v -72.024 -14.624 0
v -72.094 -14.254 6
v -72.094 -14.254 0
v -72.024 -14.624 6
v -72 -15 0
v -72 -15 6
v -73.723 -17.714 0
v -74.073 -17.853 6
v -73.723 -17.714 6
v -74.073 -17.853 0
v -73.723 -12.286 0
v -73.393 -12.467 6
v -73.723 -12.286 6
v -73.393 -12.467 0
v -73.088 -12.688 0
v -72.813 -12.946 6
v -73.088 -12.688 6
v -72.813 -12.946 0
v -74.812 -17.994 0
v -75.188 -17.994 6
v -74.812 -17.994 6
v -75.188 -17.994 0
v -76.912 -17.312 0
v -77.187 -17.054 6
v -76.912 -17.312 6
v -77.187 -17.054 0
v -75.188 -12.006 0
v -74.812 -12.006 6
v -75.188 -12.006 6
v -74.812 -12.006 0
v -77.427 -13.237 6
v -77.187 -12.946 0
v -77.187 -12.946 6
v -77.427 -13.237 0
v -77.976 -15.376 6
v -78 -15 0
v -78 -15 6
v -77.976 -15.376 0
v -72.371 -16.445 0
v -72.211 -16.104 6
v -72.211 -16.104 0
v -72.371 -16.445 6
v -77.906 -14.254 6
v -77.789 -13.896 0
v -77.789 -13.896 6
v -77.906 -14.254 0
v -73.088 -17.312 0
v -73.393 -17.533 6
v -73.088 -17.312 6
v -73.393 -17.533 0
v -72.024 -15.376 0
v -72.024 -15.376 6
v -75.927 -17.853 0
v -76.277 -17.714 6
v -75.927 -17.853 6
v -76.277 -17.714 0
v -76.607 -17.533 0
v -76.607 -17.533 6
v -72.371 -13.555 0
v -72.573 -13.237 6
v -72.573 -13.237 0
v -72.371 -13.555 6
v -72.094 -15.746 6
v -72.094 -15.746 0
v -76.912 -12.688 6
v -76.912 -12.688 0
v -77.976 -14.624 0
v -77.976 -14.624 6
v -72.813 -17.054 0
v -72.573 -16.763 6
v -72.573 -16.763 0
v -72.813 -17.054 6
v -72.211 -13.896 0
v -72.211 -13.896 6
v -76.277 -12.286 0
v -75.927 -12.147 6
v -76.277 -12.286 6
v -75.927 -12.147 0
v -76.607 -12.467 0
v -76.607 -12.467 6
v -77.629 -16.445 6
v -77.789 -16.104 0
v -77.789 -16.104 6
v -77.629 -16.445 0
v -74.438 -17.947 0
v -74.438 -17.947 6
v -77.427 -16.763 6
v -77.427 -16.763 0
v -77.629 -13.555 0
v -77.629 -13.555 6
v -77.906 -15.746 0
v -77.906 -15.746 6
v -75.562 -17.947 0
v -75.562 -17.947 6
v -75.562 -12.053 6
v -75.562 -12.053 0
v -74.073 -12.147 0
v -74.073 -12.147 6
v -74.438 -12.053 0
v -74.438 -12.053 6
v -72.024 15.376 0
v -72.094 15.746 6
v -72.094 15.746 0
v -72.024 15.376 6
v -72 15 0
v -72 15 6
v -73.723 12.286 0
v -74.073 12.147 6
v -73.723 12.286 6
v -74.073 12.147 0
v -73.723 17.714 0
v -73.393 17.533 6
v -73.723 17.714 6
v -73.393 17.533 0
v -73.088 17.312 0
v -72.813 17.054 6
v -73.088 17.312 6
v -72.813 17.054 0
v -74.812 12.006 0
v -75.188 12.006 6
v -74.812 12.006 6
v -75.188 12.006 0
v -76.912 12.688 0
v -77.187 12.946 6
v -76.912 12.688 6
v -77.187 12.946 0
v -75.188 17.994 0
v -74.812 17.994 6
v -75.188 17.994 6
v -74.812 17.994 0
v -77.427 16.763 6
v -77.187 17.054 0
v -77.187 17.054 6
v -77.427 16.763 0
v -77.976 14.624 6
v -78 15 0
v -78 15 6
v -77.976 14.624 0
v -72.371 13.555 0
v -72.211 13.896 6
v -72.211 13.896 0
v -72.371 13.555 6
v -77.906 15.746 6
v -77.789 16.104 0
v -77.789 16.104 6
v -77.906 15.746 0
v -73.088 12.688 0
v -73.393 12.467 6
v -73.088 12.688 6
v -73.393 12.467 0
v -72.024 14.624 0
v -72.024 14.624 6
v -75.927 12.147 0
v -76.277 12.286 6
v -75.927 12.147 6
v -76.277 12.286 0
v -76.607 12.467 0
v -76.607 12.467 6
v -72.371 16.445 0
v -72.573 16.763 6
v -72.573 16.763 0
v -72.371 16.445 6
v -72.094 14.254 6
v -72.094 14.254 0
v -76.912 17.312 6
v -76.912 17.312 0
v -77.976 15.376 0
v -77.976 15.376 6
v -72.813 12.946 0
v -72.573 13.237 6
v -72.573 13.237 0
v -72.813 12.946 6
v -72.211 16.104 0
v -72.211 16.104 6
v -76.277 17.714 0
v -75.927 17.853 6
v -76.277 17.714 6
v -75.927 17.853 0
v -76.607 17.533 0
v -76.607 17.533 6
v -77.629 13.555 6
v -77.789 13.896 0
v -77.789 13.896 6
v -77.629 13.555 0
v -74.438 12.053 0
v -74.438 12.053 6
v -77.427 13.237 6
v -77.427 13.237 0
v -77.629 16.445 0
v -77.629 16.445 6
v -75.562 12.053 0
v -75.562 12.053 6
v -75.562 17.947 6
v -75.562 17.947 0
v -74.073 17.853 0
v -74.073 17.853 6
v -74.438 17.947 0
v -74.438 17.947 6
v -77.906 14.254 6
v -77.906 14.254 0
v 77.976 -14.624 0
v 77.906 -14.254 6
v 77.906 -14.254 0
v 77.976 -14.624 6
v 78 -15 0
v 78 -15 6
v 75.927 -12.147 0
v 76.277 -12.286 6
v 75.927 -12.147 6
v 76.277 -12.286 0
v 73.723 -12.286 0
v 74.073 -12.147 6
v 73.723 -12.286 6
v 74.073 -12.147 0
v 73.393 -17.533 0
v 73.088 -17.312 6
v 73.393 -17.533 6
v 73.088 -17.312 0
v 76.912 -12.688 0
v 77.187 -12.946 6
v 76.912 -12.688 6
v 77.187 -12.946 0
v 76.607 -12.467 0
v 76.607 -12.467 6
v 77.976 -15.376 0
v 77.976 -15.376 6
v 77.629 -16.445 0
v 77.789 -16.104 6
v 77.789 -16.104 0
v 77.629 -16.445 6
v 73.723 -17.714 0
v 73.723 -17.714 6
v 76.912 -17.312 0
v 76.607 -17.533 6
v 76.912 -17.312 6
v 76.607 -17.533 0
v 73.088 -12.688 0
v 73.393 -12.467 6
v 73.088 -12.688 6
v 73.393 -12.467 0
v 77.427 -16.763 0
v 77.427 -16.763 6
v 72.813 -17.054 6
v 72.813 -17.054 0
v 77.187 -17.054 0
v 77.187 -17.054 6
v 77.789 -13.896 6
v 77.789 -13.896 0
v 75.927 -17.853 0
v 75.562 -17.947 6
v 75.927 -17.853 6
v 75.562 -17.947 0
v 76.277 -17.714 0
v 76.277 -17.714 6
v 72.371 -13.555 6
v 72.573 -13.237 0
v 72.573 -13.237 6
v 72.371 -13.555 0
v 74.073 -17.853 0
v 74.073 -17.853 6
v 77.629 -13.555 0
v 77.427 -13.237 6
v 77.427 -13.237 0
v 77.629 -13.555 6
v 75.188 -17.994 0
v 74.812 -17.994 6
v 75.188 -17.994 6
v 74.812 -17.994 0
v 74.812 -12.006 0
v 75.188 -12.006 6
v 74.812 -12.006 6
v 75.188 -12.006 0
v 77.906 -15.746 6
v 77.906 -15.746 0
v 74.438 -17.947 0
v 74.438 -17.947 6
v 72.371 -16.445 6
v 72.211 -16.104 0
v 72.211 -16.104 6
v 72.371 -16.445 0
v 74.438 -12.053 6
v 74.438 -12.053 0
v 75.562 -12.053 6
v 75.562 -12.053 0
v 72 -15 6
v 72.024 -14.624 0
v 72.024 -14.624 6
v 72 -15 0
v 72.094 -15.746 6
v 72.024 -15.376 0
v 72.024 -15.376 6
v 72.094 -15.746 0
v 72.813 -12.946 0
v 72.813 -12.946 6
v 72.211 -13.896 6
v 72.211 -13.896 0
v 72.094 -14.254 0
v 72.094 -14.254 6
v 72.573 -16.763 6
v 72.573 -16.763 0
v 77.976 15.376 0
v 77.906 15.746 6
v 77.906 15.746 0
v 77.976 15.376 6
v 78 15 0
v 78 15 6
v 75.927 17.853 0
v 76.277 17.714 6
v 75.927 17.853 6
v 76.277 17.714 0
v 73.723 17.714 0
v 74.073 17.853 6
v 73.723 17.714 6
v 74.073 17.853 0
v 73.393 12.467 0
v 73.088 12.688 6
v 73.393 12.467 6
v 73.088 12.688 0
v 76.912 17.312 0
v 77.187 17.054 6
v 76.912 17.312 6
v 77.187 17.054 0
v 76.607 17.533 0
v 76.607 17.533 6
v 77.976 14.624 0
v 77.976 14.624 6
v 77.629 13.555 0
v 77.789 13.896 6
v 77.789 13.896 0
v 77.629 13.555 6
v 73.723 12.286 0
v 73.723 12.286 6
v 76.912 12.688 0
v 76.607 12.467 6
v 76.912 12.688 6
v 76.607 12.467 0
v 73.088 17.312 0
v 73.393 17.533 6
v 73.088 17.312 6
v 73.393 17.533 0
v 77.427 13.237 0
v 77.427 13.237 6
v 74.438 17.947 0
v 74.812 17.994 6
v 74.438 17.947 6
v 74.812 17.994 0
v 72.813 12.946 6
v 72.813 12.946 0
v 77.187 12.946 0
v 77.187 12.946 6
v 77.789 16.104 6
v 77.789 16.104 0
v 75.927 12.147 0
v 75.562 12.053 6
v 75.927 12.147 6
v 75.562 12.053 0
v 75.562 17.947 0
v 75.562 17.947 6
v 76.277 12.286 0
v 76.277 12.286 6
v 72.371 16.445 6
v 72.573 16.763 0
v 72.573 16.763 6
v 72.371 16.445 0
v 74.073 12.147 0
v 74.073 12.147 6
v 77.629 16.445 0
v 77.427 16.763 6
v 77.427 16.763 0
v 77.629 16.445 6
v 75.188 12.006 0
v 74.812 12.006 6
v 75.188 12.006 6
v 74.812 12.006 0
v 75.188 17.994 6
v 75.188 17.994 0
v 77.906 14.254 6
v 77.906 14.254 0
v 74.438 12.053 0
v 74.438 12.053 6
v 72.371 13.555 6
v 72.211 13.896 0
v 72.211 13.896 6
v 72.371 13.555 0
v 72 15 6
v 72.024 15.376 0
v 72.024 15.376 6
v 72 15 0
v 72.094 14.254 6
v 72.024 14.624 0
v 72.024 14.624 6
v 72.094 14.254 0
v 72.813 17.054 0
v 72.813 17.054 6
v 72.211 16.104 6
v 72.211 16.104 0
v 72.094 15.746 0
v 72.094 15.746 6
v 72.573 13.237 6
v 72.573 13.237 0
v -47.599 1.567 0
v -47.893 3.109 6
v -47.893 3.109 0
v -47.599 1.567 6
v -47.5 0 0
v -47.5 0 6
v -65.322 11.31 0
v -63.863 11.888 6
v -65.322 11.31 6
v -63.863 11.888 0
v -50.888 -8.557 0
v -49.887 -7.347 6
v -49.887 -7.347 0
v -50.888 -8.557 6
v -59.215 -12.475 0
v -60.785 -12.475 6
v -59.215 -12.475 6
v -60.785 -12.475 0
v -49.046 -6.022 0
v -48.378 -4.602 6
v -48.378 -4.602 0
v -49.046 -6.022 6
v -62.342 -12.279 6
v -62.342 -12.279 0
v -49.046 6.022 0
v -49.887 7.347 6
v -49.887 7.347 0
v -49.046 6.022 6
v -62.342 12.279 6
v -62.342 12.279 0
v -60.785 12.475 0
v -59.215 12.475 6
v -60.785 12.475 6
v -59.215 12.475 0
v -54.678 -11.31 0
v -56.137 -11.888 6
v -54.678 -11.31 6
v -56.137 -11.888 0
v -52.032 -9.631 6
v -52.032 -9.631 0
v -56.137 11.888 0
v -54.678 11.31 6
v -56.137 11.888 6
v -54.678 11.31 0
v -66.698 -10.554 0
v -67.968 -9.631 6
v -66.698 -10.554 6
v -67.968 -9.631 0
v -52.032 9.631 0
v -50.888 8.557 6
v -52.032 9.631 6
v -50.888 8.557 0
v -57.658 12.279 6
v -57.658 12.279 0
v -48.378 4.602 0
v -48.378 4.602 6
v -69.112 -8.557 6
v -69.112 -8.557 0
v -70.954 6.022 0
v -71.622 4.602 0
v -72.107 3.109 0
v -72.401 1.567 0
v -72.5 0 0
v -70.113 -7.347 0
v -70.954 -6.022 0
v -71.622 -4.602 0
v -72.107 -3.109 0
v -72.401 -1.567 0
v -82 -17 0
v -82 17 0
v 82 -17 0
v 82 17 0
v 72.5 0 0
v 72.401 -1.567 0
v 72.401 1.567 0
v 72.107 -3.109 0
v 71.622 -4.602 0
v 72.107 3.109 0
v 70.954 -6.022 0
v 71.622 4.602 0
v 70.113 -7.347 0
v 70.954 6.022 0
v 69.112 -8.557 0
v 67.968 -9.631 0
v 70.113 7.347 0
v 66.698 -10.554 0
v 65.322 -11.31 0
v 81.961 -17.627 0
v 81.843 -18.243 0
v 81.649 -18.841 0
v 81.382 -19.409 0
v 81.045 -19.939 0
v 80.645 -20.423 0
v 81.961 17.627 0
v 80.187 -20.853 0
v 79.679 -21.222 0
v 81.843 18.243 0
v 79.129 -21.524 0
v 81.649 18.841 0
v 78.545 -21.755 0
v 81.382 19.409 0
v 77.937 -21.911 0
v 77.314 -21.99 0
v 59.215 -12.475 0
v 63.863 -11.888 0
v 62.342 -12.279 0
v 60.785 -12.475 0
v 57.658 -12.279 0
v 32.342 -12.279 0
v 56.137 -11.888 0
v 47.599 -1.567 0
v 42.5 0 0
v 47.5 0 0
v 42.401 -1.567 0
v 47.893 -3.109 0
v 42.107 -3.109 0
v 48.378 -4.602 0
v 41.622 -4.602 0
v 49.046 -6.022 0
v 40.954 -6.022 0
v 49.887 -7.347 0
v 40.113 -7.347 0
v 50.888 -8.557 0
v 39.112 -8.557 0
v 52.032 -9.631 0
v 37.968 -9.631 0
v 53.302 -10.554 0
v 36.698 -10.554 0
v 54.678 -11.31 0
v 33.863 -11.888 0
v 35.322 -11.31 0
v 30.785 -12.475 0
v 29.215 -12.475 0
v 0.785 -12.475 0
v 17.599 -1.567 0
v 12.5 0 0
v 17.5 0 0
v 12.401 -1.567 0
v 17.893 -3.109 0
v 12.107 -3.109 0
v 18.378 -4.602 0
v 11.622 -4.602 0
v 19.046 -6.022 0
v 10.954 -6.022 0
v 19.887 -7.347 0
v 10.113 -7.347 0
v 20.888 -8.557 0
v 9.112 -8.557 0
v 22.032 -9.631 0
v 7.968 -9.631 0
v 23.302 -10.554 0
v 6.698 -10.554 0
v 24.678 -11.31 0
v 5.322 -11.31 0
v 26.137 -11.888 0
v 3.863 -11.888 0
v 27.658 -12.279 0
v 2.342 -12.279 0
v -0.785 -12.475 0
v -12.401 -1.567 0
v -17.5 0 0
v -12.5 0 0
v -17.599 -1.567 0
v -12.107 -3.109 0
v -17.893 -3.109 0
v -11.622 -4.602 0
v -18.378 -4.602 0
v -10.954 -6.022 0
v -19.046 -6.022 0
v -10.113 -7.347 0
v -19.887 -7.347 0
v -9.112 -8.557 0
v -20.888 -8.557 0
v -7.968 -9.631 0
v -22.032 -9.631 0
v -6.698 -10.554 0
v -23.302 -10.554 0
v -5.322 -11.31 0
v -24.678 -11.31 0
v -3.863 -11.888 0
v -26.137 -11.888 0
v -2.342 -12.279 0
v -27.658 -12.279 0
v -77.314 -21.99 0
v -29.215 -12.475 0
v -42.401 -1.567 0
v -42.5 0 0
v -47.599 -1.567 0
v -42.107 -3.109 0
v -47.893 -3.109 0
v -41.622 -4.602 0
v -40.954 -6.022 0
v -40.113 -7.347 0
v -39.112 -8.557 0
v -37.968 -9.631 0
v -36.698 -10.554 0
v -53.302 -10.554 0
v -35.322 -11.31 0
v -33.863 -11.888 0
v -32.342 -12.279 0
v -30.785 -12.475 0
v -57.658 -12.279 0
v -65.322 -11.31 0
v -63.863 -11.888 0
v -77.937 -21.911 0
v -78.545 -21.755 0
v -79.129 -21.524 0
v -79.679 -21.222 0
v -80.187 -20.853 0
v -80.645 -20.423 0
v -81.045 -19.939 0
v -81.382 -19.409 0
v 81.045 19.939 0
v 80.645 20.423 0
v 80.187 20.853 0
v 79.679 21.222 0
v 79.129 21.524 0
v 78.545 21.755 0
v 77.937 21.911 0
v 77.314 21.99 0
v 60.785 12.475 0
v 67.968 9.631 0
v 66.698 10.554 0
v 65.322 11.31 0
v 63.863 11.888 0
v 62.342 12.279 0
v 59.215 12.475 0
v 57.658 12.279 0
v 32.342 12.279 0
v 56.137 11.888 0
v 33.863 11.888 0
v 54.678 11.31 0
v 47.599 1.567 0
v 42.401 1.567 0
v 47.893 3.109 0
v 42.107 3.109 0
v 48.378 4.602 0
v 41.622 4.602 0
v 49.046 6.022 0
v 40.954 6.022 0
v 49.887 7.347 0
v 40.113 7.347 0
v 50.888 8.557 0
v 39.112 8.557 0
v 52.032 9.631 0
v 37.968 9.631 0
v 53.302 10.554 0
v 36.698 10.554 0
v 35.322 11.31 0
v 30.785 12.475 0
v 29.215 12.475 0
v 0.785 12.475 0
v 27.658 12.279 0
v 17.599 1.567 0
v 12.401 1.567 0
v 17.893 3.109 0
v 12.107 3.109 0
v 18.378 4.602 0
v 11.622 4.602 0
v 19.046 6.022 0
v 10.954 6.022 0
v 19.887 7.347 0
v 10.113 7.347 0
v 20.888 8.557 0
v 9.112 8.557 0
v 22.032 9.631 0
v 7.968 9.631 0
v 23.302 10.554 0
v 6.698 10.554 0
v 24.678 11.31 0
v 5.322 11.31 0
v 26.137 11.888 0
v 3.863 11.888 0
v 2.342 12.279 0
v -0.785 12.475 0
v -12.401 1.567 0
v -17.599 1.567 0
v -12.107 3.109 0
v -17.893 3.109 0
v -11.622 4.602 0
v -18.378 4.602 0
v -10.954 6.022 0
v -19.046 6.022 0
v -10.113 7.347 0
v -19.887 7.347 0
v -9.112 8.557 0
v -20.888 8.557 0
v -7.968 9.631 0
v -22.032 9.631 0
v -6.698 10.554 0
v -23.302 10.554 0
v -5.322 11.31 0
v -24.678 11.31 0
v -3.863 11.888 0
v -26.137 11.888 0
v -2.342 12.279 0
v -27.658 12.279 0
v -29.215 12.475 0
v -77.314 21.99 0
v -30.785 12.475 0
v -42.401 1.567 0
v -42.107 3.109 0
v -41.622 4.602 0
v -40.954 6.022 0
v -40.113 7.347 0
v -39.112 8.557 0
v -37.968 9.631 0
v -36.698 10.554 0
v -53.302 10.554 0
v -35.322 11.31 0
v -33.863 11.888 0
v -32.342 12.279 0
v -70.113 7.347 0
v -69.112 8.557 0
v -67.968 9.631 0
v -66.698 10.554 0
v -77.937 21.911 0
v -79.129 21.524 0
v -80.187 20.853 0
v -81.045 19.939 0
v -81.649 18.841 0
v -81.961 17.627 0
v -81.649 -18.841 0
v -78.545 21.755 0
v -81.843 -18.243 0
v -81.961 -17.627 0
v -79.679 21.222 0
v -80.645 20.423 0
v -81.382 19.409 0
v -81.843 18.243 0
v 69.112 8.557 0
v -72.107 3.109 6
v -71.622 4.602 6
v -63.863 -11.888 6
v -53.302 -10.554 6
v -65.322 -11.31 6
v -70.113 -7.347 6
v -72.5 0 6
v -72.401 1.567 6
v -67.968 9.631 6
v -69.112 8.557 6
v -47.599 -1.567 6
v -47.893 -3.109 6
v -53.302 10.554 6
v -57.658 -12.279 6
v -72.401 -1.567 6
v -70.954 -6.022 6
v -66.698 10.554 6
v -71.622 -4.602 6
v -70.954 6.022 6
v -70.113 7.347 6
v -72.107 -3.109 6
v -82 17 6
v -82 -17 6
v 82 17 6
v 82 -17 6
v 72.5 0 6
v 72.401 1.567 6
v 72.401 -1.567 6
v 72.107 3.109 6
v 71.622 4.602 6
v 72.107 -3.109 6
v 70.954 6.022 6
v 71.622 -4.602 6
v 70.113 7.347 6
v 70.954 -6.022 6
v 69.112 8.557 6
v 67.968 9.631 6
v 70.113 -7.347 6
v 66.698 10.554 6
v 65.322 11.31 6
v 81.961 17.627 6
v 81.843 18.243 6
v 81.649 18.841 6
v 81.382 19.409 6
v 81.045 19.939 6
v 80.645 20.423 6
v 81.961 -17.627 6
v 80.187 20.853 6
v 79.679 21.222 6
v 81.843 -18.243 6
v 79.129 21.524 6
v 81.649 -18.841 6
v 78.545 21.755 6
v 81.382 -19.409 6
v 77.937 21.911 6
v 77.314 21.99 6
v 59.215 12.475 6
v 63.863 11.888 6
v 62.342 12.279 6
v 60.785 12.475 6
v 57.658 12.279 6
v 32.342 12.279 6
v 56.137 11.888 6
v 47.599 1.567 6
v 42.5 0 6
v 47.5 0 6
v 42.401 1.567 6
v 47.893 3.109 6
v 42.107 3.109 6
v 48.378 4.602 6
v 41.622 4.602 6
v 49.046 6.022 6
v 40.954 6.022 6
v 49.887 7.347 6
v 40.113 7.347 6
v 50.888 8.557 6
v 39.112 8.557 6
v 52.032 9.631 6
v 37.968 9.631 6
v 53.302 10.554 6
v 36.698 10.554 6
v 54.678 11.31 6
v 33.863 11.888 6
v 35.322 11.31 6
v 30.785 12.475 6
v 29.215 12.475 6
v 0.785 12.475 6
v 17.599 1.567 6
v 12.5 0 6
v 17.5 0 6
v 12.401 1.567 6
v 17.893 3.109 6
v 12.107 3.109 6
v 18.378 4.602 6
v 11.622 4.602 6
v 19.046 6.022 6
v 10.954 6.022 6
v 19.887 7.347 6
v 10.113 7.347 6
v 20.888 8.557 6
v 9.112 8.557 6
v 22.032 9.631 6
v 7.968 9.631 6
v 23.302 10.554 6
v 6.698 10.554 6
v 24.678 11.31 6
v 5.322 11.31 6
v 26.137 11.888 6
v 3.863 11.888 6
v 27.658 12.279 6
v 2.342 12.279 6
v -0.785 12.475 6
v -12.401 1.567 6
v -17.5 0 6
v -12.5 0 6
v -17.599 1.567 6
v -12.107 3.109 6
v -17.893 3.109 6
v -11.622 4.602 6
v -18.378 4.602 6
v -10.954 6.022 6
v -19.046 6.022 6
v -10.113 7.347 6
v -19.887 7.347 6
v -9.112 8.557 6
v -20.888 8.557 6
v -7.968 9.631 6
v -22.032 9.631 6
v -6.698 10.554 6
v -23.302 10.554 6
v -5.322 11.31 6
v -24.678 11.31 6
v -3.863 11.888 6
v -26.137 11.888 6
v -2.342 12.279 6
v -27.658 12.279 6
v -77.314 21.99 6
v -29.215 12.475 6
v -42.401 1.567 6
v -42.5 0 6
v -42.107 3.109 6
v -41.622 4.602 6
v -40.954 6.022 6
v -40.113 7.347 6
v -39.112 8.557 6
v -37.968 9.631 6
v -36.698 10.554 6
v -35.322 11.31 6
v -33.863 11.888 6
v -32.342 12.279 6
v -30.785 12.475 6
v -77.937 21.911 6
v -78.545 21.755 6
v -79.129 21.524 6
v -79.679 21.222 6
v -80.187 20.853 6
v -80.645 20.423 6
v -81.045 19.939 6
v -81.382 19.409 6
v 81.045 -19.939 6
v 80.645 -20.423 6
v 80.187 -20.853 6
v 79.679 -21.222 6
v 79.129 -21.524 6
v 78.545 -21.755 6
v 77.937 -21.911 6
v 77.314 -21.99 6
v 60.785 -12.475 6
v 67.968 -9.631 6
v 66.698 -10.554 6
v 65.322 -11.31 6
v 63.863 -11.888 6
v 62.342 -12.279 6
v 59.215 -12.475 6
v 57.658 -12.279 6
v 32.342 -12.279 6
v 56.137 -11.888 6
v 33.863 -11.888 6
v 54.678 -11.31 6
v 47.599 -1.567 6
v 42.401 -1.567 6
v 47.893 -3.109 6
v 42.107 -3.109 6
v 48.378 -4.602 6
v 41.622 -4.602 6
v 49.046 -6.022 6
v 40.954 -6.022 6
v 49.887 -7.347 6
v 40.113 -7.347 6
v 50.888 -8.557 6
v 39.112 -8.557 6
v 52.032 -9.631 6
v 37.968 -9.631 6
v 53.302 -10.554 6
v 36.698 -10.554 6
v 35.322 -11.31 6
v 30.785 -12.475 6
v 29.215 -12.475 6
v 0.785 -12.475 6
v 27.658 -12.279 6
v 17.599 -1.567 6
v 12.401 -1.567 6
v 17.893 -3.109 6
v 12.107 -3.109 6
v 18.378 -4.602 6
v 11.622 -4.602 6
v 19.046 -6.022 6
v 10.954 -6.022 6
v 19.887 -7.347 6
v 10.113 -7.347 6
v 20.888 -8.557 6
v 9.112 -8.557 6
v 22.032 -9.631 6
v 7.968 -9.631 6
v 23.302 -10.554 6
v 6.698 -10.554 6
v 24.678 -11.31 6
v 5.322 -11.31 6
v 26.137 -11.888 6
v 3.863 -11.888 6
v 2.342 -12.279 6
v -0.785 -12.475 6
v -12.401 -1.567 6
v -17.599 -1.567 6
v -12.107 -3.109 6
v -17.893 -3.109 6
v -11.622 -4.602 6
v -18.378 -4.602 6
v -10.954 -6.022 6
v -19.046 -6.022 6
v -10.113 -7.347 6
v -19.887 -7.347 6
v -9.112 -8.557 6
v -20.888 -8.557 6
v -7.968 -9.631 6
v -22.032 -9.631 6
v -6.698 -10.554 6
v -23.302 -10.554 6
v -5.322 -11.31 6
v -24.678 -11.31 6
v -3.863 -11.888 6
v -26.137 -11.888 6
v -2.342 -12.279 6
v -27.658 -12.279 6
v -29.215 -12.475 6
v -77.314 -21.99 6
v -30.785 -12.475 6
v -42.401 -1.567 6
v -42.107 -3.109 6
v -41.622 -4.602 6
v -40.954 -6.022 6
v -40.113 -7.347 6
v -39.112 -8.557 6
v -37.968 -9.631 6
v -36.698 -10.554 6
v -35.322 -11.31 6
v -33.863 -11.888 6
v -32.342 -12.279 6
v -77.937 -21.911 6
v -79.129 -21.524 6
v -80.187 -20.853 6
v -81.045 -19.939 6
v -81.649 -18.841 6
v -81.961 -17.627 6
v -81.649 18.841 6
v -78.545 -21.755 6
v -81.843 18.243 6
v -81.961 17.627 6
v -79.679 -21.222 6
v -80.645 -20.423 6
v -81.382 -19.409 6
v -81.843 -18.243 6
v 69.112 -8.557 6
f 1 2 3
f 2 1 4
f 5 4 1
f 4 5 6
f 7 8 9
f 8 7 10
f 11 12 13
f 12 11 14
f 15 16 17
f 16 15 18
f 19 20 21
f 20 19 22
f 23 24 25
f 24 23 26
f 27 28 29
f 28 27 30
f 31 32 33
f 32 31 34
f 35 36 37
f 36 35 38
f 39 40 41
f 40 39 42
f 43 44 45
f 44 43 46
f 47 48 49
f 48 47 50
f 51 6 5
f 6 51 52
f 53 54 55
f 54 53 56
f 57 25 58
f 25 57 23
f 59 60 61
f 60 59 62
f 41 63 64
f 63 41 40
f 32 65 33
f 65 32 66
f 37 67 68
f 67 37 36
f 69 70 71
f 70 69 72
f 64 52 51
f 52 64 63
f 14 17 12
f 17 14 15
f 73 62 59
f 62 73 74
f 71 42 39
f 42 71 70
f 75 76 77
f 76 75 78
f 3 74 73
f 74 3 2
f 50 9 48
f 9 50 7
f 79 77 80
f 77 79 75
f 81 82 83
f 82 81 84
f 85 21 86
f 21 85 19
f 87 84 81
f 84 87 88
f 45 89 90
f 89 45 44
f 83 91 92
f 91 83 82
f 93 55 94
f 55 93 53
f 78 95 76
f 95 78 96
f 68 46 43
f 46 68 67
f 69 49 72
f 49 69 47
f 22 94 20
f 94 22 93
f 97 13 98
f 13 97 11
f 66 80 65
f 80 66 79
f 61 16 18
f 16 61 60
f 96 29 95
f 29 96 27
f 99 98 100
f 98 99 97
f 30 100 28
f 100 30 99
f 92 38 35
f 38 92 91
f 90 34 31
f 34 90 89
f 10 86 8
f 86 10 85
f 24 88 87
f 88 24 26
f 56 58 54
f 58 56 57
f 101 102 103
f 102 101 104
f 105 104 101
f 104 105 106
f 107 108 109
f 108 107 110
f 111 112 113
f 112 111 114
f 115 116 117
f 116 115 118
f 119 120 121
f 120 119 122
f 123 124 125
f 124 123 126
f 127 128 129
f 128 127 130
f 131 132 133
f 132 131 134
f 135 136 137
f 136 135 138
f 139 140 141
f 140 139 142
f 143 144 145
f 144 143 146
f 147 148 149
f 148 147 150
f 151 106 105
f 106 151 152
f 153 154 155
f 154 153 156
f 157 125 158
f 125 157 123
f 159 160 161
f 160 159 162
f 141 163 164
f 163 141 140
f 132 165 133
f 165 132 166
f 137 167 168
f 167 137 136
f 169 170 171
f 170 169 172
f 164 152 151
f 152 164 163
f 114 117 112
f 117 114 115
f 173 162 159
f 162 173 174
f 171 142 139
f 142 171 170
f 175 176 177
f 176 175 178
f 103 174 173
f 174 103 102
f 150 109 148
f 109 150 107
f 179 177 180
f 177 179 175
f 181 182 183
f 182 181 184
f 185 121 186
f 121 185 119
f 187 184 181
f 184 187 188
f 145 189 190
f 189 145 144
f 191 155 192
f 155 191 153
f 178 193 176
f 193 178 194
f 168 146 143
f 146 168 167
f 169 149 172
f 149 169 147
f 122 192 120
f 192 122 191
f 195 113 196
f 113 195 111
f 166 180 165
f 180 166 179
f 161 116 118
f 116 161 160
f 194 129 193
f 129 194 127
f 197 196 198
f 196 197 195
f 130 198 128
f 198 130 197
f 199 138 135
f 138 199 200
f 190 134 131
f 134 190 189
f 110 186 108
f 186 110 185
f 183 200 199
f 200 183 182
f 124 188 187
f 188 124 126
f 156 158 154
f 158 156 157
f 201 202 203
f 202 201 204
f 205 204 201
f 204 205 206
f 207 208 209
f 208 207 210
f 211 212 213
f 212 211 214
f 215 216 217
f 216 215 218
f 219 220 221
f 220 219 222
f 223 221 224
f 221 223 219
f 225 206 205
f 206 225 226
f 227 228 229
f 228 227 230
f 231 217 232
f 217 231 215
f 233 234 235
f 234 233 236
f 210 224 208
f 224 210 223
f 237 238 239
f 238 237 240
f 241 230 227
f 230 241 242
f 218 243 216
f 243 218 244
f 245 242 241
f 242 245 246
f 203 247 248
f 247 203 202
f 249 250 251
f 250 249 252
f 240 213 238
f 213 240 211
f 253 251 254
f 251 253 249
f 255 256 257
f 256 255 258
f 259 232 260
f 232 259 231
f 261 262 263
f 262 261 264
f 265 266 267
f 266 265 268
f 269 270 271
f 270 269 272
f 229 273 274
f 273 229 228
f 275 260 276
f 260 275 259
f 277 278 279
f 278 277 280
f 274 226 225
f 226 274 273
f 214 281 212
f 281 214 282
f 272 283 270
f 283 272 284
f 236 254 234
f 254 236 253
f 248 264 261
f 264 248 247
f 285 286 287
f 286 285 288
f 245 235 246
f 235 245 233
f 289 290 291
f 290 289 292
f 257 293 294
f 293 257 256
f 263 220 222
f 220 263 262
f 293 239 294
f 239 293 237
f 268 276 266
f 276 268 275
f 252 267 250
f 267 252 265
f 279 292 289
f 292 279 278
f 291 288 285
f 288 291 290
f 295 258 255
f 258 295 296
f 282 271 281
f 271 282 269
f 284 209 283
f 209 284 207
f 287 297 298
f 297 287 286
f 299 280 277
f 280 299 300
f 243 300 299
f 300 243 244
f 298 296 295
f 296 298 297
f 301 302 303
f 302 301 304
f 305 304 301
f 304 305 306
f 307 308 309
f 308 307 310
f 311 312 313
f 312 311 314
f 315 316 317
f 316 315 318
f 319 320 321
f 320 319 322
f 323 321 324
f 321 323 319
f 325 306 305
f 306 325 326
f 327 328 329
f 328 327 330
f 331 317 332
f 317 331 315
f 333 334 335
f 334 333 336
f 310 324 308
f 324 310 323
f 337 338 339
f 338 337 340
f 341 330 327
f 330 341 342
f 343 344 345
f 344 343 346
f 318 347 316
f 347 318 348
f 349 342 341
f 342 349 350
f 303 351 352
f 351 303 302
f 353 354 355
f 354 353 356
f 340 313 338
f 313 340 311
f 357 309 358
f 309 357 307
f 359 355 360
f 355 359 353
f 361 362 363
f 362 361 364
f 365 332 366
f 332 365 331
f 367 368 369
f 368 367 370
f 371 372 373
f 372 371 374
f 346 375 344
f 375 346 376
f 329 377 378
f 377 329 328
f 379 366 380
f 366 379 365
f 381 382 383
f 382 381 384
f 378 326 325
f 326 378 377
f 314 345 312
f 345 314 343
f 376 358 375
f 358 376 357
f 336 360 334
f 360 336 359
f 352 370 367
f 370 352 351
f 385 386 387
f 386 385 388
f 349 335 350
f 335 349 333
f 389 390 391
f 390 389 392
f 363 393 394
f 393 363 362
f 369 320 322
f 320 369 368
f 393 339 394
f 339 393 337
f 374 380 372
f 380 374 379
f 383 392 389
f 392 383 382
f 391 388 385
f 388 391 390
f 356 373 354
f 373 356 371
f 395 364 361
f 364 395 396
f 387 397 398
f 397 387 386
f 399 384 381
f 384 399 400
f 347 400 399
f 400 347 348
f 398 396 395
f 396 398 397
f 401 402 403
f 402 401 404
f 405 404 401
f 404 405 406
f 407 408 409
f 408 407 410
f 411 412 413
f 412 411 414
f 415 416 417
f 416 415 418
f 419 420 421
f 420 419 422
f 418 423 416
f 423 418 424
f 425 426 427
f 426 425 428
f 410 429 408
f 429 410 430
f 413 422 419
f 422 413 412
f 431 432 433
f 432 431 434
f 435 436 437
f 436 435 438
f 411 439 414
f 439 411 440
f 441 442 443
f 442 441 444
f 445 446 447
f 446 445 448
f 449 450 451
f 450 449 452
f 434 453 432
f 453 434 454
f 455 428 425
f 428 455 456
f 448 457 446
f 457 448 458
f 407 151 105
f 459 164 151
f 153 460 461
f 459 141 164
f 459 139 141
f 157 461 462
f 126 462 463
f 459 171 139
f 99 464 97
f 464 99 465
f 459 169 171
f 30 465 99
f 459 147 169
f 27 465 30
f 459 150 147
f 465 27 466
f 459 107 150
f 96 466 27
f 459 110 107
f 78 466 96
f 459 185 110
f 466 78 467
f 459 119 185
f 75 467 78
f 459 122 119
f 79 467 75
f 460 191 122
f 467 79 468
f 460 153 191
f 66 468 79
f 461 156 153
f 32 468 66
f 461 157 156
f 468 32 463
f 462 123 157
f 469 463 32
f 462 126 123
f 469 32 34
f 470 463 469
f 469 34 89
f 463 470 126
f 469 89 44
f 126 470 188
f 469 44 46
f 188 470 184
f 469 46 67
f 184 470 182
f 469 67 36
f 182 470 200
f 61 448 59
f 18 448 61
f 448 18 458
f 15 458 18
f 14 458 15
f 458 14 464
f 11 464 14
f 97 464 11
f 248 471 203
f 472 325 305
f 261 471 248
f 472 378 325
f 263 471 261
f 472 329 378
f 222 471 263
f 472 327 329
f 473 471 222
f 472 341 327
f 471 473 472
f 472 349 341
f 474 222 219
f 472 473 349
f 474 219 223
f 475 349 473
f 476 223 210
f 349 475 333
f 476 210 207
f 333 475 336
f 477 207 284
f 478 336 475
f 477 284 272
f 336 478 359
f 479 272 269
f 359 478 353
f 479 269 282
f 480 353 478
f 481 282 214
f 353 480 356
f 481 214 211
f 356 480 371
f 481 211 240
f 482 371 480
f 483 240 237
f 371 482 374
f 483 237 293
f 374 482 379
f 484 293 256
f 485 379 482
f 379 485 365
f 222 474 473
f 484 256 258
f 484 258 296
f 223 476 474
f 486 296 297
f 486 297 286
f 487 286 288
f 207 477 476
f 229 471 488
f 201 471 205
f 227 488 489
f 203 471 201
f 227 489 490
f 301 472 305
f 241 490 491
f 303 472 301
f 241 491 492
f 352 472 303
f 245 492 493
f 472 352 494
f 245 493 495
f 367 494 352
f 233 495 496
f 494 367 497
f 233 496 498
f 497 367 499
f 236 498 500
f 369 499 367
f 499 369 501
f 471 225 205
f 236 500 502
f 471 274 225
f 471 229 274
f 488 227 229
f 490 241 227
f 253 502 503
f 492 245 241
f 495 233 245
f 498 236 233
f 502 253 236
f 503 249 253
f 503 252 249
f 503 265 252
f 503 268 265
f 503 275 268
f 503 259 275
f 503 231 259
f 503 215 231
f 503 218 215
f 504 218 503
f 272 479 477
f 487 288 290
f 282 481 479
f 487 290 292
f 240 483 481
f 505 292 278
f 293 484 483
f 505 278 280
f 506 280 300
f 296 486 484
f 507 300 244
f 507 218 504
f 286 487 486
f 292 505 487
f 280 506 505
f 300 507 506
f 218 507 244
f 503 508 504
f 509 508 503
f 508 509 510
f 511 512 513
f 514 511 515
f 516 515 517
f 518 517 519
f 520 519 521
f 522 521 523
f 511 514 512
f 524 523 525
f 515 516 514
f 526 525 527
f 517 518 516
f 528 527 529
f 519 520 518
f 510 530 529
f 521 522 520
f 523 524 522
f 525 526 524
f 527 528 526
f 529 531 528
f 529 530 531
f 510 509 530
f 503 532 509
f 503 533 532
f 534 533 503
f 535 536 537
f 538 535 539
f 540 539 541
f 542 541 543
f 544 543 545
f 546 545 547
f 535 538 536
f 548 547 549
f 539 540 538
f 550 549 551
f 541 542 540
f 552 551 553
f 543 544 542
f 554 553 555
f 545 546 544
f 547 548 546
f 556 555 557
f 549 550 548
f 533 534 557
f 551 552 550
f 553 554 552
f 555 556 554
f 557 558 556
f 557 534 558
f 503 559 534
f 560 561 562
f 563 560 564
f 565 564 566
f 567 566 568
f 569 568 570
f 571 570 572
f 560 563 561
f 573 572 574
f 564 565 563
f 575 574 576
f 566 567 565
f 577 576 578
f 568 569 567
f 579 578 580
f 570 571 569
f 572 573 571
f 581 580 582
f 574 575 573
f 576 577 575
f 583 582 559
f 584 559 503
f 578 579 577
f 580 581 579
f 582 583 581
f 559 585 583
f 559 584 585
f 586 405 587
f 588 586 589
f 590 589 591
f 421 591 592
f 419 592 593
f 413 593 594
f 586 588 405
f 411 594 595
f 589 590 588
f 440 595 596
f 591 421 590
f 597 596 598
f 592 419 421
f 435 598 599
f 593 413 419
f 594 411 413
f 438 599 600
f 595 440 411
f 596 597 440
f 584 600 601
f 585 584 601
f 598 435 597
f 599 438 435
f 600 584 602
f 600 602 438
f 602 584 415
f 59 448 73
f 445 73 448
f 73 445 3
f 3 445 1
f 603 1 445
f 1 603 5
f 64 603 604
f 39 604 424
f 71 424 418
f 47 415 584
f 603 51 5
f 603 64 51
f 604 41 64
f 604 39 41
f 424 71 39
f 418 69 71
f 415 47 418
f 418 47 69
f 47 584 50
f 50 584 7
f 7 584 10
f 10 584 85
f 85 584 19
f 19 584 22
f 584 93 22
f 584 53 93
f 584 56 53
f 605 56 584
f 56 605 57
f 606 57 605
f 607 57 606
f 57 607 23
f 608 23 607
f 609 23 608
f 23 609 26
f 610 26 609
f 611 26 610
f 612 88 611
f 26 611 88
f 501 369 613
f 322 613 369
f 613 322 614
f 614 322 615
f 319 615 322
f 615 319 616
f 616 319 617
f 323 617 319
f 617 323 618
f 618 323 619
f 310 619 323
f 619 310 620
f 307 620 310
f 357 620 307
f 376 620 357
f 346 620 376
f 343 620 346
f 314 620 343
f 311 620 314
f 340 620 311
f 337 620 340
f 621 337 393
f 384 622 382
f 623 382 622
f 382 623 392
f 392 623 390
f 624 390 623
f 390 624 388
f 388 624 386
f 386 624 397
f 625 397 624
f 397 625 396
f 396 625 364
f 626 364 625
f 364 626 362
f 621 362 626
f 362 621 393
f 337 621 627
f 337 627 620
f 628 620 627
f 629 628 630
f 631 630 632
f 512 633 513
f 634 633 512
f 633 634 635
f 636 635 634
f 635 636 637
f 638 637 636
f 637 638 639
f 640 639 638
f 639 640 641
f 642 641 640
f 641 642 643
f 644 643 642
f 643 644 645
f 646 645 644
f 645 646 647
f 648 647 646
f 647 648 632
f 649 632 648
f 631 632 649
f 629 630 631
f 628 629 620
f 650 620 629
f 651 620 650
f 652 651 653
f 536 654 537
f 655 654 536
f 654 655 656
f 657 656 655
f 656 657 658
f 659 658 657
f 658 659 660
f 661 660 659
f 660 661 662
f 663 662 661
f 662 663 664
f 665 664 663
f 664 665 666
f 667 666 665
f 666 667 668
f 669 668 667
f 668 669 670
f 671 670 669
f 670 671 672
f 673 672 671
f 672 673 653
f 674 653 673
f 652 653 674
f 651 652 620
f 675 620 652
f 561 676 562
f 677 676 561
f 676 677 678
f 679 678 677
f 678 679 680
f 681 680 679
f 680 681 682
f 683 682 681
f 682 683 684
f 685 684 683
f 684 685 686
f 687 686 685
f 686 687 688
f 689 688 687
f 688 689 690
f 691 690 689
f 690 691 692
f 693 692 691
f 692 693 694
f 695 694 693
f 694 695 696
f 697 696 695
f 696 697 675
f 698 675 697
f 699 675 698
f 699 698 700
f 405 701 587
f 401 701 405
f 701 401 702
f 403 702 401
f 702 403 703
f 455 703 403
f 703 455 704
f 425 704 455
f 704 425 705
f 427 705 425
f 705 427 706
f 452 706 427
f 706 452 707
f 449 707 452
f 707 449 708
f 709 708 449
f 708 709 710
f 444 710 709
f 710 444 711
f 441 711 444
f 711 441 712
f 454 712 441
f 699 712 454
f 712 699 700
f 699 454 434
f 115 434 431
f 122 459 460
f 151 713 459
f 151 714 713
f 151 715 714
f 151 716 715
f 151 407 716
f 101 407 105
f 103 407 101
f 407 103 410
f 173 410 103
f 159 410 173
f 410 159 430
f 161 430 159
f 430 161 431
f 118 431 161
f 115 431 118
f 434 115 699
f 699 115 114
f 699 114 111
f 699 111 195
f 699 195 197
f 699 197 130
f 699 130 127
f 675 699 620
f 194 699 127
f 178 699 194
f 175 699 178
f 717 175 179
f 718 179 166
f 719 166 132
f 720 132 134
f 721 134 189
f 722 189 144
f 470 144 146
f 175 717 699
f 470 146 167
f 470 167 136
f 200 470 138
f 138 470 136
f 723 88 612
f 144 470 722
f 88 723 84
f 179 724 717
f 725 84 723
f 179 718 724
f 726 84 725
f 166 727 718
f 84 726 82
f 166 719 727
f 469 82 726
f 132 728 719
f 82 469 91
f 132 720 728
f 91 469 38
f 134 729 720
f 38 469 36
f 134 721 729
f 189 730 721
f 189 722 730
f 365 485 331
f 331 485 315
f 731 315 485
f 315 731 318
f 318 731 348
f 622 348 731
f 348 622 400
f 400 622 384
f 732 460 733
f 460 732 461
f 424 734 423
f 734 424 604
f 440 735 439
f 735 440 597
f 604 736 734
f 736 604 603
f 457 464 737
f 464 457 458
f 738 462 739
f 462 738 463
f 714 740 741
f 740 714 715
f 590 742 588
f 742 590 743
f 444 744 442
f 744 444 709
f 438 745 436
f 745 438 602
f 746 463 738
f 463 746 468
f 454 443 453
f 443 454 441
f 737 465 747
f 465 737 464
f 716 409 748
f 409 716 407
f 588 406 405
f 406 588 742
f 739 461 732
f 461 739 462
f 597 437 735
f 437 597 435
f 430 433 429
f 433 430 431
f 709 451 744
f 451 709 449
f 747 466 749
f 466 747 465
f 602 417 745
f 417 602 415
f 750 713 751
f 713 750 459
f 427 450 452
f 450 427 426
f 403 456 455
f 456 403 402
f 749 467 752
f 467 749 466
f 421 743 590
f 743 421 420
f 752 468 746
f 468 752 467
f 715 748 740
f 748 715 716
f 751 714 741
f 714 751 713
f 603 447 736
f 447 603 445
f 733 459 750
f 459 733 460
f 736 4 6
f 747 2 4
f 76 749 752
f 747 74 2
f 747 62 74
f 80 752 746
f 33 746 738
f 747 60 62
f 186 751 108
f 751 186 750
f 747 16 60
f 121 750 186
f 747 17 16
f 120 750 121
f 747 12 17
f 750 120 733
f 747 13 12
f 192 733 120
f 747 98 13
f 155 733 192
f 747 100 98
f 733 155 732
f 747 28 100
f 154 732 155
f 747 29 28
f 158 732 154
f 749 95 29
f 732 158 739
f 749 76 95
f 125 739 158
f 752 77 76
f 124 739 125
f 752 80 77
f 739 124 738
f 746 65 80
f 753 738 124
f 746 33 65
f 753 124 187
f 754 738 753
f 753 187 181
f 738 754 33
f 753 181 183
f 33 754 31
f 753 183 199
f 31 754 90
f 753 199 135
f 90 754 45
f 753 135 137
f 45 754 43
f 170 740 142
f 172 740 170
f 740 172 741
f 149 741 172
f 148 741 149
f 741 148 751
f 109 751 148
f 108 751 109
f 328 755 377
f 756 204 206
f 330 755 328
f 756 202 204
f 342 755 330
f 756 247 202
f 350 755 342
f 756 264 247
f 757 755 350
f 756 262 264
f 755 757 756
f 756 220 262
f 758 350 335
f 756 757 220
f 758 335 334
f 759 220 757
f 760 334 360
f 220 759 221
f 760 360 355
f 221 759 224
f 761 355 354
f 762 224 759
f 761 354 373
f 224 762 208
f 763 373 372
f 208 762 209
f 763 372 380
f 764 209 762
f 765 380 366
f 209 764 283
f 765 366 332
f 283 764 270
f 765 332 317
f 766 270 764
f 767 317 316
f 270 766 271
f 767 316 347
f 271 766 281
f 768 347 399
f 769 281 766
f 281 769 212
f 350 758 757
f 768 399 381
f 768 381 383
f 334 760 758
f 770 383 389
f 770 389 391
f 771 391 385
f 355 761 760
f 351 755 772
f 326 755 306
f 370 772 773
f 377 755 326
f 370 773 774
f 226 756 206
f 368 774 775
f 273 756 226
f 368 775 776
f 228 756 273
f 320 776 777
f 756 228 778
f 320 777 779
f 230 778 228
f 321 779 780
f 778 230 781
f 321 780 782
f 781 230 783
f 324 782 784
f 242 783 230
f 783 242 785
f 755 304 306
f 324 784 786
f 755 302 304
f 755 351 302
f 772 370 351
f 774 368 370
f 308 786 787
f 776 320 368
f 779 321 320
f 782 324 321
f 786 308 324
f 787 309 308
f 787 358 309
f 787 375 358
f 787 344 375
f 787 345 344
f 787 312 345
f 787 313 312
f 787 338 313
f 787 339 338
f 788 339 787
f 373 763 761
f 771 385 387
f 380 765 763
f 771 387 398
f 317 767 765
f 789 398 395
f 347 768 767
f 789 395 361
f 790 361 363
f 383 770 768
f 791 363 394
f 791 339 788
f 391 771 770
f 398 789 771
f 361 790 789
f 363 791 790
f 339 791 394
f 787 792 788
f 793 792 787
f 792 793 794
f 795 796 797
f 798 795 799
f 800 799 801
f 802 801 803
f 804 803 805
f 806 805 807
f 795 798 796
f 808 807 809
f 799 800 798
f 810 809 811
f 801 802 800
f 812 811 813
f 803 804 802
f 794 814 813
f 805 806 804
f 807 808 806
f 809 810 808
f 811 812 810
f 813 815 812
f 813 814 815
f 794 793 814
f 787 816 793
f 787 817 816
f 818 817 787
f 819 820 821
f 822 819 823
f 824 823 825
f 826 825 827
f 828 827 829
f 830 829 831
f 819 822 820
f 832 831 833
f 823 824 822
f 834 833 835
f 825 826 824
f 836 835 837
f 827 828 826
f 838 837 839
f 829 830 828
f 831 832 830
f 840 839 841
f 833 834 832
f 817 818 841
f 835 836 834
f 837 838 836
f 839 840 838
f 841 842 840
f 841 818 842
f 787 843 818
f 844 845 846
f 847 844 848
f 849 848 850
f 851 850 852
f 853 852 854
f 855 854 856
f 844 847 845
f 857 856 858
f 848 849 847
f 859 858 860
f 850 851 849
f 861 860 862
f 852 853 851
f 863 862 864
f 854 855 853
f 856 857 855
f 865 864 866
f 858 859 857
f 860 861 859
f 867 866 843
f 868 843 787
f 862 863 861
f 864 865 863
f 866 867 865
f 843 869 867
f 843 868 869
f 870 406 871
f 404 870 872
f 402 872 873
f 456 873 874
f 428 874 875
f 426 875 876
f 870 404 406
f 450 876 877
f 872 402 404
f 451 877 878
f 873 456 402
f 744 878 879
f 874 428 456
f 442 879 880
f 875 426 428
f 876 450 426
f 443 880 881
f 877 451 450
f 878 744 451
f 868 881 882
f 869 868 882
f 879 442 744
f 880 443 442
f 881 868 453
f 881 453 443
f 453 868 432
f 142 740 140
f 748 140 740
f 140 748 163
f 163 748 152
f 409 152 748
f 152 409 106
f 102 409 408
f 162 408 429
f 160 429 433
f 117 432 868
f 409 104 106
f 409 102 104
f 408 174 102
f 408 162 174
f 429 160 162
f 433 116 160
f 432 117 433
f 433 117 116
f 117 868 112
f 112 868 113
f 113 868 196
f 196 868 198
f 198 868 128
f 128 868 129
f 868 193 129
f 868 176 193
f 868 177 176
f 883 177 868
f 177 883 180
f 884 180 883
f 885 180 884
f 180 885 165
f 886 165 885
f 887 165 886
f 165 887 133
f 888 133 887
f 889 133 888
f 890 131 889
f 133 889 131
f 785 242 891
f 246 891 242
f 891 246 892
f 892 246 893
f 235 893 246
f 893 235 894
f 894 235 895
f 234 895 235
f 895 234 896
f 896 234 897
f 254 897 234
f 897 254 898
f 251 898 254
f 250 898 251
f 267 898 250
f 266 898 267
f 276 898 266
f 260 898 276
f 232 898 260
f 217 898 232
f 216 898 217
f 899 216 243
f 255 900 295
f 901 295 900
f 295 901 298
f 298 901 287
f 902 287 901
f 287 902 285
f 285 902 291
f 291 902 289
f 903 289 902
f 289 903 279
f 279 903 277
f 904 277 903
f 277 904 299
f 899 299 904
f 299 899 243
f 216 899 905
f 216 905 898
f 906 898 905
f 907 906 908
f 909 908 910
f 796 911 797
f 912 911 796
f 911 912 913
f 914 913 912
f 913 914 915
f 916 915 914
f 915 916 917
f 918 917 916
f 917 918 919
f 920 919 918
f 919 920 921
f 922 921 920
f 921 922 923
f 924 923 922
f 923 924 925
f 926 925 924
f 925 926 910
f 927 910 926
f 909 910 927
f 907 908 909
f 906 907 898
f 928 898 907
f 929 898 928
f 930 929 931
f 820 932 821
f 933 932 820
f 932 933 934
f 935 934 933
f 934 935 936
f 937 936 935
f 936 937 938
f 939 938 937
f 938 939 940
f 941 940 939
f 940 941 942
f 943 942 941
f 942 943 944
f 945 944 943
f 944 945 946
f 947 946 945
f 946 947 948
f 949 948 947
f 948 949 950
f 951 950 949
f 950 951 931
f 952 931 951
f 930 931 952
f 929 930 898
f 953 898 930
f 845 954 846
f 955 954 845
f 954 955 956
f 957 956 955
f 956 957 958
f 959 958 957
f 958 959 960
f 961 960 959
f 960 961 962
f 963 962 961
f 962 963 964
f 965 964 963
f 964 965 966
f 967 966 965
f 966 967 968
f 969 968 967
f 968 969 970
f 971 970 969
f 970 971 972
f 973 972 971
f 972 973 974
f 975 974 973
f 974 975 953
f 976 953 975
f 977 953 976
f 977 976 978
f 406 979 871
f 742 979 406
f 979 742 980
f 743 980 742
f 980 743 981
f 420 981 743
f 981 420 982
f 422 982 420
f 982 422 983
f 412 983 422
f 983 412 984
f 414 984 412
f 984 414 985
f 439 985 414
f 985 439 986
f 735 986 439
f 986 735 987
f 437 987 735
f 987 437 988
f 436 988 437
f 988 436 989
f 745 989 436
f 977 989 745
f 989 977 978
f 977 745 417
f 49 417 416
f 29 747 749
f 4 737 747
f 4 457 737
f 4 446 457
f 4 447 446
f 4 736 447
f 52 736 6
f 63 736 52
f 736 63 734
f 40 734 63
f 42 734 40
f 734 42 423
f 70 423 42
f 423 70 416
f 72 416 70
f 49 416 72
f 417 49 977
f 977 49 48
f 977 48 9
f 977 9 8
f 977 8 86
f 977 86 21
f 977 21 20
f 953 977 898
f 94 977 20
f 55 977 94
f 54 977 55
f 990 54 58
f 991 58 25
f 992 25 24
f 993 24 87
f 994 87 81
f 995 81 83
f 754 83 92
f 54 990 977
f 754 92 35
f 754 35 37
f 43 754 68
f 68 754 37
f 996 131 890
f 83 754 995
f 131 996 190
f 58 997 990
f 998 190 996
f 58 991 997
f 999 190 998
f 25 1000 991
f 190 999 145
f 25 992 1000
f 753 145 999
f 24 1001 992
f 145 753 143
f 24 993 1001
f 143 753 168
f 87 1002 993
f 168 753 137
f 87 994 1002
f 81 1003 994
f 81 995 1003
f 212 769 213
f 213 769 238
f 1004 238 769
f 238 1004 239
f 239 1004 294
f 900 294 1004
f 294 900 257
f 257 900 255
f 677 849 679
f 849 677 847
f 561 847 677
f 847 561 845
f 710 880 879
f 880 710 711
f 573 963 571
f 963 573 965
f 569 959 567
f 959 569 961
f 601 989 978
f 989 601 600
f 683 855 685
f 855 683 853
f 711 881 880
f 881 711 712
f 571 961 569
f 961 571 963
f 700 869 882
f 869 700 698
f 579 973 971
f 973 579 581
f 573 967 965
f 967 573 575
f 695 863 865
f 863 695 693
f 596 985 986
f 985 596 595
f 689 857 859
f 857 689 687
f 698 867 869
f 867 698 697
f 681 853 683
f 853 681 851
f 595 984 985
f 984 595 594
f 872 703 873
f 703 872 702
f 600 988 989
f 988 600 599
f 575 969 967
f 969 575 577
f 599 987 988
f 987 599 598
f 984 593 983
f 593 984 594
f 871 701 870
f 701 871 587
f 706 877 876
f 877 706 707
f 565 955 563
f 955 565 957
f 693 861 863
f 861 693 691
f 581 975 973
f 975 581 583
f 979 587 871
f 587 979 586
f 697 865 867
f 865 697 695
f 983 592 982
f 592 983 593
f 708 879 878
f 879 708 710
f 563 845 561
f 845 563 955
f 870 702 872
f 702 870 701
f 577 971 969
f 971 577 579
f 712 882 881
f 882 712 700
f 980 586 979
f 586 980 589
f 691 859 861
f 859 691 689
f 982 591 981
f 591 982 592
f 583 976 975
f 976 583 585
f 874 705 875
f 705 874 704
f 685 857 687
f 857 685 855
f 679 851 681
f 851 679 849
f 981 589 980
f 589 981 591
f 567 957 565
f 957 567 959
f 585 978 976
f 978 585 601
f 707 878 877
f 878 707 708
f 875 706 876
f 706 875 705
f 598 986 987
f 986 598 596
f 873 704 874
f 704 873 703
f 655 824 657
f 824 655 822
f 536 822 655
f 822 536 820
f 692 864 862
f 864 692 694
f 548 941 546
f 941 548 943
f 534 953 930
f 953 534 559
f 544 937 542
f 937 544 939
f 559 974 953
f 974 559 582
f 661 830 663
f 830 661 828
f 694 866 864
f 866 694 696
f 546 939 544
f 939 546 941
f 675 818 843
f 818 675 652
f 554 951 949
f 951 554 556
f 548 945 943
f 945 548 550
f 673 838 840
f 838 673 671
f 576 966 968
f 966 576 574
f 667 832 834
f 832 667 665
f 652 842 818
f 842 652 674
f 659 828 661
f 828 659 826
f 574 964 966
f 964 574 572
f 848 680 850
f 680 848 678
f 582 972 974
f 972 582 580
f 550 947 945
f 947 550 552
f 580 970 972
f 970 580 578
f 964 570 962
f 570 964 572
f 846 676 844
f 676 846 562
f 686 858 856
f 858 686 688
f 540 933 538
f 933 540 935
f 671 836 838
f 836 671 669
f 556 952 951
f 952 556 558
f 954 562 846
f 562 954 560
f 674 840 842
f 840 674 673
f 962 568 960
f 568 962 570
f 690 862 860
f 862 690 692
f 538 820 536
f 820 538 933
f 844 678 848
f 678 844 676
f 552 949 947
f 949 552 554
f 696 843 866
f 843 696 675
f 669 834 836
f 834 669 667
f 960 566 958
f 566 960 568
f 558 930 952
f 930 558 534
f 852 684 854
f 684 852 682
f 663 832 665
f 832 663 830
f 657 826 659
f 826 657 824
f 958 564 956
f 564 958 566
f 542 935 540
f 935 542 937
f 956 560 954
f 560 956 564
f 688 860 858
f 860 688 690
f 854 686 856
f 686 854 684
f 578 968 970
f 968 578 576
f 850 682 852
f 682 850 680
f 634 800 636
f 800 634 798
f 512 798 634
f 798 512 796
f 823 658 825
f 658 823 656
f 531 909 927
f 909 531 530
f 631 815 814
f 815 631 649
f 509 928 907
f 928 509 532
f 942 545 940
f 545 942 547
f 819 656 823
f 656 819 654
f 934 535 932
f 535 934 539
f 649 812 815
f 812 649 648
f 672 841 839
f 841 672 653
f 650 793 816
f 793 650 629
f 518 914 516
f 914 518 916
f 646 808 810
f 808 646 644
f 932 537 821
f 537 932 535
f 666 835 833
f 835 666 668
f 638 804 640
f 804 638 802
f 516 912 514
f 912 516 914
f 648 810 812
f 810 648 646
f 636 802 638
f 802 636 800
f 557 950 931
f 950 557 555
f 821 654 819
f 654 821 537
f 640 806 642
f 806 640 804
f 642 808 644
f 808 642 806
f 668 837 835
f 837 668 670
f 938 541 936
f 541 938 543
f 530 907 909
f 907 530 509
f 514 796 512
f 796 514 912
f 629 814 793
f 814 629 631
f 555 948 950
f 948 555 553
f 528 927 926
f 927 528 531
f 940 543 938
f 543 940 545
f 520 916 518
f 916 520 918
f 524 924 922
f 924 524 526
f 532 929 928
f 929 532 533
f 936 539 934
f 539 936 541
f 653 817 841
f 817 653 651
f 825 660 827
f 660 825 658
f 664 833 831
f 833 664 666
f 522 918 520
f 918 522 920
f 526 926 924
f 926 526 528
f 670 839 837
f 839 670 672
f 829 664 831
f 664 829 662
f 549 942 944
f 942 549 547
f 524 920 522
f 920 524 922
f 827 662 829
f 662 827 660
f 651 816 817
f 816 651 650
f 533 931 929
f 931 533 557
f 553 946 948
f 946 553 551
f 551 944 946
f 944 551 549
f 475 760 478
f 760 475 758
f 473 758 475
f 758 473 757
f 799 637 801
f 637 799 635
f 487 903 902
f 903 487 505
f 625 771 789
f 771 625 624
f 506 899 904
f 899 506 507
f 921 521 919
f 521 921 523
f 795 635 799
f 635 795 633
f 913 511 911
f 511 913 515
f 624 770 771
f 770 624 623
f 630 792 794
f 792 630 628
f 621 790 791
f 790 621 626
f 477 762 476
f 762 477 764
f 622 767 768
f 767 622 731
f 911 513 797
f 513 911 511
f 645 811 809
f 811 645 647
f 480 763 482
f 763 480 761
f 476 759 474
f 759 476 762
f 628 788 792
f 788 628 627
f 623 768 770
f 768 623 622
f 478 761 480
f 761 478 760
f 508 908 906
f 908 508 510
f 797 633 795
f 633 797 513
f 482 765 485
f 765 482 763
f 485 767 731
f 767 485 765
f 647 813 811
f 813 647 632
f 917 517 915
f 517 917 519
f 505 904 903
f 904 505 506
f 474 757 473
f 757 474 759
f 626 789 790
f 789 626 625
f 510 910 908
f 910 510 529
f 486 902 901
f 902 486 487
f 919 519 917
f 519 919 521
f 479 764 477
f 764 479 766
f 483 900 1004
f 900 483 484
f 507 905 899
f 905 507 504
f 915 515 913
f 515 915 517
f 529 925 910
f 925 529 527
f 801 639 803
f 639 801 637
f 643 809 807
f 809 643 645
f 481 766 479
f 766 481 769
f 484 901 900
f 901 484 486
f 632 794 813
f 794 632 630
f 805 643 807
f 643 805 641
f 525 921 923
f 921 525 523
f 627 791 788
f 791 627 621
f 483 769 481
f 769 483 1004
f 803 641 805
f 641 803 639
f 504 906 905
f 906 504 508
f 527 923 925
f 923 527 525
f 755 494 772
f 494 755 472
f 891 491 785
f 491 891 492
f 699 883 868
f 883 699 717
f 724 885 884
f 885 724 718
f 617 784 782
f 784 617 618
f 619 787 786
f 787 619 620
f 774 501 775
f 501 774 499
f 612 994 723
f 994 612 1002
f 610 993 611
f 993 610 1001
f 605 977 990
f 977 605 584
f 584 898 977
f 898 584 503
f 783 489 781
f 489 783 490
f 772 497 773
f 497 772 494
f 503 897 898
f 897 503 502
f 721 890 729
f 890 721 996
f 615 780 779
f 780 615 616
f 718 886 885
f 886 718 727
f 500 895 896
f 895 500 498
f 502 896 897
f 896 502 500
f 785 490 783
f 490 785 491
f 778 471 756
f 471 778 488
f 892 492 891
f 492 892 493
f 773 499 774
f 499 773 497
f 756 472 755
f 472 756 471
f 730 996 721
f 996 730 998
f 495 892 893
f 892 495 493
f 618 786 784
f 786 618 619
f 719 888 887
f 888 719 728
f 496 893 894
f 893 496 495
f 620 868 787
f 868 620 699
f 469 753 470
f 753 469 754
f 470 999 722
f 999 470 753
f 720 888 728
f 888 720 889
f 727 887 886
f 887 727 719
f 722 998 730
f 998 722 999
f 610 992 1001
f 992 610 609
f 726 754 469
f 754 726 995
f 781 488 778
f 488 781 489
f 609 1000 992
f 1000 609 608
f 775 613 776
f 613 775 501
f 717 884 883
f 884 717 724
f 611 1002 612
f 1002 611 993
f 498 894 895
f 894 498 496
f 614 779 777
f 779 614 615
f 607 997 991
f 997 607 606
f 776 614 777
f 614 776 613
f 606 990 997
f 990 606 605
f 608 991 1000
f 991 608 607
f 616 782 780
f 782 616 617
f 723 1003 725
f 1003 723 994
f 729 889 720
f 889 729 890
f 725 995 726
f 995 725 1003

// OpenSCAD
$fn = 50;


difference() {
	union() {
		hull() {
			translate(v = [-77.0000000000, 17.0000000000, 0]) {
				cylinder(h = 6, r = 5);
			}
			translate(v = [77.0000000000, 17.0000000000, 0]) {
				cylinder(h = 6, r = 5);
			}
			translate(v = [-77.0000000000, -17.0000000000, 0]) {
				cylinder(h = 6, r = 5);
			}
			translate(v = [77.0000000000, -17.0000000000, 0]) {
				cylinder(h = 6, r = 5);
			}
		}
	}
	union() {
		#translate(v = [-75.0000000000, -15.0000000000, -100.0000000000]) {
			cylinder(h = 200, r = 3.0000000000);
		}
		#translate(v = [-75.0000000000, 15.0000000000, -100.0000000000]) {
			cylinder(h = 200, r = 3.0000000000);
		}
		#translate(v = [75.0000000000, -15.0000000000, -100.0000000000]) {
			cylinder(h = 200, r = 3.0000000000);
		}
		#translate(v = [75.0000000000, 15.0000000000, -100.0000000000]) {
			cylinder(h = 200, r = 3.0000000000);
		}
		#translate(v = [-60.0000000000, 0, 0]) {
			cylinder(h = 6, r = 12.5000000000);
		}
		#translate(v = [-30.0000000000, 0, 0]) {
			cylinder(h = 6, r = 12.5000000000);
		}
		#cylinder(h = 6, r = 12.5000000000);
		#translate(v = [30.0000000000, 0, 0]) {
			cylinder(h = 6, r = 12.5000000000);
		}
		#translate(v = [60.0000000000, 0, 0]) {
			cylinder(h = 6, r = 12.5000000000);
		}
	}
}
